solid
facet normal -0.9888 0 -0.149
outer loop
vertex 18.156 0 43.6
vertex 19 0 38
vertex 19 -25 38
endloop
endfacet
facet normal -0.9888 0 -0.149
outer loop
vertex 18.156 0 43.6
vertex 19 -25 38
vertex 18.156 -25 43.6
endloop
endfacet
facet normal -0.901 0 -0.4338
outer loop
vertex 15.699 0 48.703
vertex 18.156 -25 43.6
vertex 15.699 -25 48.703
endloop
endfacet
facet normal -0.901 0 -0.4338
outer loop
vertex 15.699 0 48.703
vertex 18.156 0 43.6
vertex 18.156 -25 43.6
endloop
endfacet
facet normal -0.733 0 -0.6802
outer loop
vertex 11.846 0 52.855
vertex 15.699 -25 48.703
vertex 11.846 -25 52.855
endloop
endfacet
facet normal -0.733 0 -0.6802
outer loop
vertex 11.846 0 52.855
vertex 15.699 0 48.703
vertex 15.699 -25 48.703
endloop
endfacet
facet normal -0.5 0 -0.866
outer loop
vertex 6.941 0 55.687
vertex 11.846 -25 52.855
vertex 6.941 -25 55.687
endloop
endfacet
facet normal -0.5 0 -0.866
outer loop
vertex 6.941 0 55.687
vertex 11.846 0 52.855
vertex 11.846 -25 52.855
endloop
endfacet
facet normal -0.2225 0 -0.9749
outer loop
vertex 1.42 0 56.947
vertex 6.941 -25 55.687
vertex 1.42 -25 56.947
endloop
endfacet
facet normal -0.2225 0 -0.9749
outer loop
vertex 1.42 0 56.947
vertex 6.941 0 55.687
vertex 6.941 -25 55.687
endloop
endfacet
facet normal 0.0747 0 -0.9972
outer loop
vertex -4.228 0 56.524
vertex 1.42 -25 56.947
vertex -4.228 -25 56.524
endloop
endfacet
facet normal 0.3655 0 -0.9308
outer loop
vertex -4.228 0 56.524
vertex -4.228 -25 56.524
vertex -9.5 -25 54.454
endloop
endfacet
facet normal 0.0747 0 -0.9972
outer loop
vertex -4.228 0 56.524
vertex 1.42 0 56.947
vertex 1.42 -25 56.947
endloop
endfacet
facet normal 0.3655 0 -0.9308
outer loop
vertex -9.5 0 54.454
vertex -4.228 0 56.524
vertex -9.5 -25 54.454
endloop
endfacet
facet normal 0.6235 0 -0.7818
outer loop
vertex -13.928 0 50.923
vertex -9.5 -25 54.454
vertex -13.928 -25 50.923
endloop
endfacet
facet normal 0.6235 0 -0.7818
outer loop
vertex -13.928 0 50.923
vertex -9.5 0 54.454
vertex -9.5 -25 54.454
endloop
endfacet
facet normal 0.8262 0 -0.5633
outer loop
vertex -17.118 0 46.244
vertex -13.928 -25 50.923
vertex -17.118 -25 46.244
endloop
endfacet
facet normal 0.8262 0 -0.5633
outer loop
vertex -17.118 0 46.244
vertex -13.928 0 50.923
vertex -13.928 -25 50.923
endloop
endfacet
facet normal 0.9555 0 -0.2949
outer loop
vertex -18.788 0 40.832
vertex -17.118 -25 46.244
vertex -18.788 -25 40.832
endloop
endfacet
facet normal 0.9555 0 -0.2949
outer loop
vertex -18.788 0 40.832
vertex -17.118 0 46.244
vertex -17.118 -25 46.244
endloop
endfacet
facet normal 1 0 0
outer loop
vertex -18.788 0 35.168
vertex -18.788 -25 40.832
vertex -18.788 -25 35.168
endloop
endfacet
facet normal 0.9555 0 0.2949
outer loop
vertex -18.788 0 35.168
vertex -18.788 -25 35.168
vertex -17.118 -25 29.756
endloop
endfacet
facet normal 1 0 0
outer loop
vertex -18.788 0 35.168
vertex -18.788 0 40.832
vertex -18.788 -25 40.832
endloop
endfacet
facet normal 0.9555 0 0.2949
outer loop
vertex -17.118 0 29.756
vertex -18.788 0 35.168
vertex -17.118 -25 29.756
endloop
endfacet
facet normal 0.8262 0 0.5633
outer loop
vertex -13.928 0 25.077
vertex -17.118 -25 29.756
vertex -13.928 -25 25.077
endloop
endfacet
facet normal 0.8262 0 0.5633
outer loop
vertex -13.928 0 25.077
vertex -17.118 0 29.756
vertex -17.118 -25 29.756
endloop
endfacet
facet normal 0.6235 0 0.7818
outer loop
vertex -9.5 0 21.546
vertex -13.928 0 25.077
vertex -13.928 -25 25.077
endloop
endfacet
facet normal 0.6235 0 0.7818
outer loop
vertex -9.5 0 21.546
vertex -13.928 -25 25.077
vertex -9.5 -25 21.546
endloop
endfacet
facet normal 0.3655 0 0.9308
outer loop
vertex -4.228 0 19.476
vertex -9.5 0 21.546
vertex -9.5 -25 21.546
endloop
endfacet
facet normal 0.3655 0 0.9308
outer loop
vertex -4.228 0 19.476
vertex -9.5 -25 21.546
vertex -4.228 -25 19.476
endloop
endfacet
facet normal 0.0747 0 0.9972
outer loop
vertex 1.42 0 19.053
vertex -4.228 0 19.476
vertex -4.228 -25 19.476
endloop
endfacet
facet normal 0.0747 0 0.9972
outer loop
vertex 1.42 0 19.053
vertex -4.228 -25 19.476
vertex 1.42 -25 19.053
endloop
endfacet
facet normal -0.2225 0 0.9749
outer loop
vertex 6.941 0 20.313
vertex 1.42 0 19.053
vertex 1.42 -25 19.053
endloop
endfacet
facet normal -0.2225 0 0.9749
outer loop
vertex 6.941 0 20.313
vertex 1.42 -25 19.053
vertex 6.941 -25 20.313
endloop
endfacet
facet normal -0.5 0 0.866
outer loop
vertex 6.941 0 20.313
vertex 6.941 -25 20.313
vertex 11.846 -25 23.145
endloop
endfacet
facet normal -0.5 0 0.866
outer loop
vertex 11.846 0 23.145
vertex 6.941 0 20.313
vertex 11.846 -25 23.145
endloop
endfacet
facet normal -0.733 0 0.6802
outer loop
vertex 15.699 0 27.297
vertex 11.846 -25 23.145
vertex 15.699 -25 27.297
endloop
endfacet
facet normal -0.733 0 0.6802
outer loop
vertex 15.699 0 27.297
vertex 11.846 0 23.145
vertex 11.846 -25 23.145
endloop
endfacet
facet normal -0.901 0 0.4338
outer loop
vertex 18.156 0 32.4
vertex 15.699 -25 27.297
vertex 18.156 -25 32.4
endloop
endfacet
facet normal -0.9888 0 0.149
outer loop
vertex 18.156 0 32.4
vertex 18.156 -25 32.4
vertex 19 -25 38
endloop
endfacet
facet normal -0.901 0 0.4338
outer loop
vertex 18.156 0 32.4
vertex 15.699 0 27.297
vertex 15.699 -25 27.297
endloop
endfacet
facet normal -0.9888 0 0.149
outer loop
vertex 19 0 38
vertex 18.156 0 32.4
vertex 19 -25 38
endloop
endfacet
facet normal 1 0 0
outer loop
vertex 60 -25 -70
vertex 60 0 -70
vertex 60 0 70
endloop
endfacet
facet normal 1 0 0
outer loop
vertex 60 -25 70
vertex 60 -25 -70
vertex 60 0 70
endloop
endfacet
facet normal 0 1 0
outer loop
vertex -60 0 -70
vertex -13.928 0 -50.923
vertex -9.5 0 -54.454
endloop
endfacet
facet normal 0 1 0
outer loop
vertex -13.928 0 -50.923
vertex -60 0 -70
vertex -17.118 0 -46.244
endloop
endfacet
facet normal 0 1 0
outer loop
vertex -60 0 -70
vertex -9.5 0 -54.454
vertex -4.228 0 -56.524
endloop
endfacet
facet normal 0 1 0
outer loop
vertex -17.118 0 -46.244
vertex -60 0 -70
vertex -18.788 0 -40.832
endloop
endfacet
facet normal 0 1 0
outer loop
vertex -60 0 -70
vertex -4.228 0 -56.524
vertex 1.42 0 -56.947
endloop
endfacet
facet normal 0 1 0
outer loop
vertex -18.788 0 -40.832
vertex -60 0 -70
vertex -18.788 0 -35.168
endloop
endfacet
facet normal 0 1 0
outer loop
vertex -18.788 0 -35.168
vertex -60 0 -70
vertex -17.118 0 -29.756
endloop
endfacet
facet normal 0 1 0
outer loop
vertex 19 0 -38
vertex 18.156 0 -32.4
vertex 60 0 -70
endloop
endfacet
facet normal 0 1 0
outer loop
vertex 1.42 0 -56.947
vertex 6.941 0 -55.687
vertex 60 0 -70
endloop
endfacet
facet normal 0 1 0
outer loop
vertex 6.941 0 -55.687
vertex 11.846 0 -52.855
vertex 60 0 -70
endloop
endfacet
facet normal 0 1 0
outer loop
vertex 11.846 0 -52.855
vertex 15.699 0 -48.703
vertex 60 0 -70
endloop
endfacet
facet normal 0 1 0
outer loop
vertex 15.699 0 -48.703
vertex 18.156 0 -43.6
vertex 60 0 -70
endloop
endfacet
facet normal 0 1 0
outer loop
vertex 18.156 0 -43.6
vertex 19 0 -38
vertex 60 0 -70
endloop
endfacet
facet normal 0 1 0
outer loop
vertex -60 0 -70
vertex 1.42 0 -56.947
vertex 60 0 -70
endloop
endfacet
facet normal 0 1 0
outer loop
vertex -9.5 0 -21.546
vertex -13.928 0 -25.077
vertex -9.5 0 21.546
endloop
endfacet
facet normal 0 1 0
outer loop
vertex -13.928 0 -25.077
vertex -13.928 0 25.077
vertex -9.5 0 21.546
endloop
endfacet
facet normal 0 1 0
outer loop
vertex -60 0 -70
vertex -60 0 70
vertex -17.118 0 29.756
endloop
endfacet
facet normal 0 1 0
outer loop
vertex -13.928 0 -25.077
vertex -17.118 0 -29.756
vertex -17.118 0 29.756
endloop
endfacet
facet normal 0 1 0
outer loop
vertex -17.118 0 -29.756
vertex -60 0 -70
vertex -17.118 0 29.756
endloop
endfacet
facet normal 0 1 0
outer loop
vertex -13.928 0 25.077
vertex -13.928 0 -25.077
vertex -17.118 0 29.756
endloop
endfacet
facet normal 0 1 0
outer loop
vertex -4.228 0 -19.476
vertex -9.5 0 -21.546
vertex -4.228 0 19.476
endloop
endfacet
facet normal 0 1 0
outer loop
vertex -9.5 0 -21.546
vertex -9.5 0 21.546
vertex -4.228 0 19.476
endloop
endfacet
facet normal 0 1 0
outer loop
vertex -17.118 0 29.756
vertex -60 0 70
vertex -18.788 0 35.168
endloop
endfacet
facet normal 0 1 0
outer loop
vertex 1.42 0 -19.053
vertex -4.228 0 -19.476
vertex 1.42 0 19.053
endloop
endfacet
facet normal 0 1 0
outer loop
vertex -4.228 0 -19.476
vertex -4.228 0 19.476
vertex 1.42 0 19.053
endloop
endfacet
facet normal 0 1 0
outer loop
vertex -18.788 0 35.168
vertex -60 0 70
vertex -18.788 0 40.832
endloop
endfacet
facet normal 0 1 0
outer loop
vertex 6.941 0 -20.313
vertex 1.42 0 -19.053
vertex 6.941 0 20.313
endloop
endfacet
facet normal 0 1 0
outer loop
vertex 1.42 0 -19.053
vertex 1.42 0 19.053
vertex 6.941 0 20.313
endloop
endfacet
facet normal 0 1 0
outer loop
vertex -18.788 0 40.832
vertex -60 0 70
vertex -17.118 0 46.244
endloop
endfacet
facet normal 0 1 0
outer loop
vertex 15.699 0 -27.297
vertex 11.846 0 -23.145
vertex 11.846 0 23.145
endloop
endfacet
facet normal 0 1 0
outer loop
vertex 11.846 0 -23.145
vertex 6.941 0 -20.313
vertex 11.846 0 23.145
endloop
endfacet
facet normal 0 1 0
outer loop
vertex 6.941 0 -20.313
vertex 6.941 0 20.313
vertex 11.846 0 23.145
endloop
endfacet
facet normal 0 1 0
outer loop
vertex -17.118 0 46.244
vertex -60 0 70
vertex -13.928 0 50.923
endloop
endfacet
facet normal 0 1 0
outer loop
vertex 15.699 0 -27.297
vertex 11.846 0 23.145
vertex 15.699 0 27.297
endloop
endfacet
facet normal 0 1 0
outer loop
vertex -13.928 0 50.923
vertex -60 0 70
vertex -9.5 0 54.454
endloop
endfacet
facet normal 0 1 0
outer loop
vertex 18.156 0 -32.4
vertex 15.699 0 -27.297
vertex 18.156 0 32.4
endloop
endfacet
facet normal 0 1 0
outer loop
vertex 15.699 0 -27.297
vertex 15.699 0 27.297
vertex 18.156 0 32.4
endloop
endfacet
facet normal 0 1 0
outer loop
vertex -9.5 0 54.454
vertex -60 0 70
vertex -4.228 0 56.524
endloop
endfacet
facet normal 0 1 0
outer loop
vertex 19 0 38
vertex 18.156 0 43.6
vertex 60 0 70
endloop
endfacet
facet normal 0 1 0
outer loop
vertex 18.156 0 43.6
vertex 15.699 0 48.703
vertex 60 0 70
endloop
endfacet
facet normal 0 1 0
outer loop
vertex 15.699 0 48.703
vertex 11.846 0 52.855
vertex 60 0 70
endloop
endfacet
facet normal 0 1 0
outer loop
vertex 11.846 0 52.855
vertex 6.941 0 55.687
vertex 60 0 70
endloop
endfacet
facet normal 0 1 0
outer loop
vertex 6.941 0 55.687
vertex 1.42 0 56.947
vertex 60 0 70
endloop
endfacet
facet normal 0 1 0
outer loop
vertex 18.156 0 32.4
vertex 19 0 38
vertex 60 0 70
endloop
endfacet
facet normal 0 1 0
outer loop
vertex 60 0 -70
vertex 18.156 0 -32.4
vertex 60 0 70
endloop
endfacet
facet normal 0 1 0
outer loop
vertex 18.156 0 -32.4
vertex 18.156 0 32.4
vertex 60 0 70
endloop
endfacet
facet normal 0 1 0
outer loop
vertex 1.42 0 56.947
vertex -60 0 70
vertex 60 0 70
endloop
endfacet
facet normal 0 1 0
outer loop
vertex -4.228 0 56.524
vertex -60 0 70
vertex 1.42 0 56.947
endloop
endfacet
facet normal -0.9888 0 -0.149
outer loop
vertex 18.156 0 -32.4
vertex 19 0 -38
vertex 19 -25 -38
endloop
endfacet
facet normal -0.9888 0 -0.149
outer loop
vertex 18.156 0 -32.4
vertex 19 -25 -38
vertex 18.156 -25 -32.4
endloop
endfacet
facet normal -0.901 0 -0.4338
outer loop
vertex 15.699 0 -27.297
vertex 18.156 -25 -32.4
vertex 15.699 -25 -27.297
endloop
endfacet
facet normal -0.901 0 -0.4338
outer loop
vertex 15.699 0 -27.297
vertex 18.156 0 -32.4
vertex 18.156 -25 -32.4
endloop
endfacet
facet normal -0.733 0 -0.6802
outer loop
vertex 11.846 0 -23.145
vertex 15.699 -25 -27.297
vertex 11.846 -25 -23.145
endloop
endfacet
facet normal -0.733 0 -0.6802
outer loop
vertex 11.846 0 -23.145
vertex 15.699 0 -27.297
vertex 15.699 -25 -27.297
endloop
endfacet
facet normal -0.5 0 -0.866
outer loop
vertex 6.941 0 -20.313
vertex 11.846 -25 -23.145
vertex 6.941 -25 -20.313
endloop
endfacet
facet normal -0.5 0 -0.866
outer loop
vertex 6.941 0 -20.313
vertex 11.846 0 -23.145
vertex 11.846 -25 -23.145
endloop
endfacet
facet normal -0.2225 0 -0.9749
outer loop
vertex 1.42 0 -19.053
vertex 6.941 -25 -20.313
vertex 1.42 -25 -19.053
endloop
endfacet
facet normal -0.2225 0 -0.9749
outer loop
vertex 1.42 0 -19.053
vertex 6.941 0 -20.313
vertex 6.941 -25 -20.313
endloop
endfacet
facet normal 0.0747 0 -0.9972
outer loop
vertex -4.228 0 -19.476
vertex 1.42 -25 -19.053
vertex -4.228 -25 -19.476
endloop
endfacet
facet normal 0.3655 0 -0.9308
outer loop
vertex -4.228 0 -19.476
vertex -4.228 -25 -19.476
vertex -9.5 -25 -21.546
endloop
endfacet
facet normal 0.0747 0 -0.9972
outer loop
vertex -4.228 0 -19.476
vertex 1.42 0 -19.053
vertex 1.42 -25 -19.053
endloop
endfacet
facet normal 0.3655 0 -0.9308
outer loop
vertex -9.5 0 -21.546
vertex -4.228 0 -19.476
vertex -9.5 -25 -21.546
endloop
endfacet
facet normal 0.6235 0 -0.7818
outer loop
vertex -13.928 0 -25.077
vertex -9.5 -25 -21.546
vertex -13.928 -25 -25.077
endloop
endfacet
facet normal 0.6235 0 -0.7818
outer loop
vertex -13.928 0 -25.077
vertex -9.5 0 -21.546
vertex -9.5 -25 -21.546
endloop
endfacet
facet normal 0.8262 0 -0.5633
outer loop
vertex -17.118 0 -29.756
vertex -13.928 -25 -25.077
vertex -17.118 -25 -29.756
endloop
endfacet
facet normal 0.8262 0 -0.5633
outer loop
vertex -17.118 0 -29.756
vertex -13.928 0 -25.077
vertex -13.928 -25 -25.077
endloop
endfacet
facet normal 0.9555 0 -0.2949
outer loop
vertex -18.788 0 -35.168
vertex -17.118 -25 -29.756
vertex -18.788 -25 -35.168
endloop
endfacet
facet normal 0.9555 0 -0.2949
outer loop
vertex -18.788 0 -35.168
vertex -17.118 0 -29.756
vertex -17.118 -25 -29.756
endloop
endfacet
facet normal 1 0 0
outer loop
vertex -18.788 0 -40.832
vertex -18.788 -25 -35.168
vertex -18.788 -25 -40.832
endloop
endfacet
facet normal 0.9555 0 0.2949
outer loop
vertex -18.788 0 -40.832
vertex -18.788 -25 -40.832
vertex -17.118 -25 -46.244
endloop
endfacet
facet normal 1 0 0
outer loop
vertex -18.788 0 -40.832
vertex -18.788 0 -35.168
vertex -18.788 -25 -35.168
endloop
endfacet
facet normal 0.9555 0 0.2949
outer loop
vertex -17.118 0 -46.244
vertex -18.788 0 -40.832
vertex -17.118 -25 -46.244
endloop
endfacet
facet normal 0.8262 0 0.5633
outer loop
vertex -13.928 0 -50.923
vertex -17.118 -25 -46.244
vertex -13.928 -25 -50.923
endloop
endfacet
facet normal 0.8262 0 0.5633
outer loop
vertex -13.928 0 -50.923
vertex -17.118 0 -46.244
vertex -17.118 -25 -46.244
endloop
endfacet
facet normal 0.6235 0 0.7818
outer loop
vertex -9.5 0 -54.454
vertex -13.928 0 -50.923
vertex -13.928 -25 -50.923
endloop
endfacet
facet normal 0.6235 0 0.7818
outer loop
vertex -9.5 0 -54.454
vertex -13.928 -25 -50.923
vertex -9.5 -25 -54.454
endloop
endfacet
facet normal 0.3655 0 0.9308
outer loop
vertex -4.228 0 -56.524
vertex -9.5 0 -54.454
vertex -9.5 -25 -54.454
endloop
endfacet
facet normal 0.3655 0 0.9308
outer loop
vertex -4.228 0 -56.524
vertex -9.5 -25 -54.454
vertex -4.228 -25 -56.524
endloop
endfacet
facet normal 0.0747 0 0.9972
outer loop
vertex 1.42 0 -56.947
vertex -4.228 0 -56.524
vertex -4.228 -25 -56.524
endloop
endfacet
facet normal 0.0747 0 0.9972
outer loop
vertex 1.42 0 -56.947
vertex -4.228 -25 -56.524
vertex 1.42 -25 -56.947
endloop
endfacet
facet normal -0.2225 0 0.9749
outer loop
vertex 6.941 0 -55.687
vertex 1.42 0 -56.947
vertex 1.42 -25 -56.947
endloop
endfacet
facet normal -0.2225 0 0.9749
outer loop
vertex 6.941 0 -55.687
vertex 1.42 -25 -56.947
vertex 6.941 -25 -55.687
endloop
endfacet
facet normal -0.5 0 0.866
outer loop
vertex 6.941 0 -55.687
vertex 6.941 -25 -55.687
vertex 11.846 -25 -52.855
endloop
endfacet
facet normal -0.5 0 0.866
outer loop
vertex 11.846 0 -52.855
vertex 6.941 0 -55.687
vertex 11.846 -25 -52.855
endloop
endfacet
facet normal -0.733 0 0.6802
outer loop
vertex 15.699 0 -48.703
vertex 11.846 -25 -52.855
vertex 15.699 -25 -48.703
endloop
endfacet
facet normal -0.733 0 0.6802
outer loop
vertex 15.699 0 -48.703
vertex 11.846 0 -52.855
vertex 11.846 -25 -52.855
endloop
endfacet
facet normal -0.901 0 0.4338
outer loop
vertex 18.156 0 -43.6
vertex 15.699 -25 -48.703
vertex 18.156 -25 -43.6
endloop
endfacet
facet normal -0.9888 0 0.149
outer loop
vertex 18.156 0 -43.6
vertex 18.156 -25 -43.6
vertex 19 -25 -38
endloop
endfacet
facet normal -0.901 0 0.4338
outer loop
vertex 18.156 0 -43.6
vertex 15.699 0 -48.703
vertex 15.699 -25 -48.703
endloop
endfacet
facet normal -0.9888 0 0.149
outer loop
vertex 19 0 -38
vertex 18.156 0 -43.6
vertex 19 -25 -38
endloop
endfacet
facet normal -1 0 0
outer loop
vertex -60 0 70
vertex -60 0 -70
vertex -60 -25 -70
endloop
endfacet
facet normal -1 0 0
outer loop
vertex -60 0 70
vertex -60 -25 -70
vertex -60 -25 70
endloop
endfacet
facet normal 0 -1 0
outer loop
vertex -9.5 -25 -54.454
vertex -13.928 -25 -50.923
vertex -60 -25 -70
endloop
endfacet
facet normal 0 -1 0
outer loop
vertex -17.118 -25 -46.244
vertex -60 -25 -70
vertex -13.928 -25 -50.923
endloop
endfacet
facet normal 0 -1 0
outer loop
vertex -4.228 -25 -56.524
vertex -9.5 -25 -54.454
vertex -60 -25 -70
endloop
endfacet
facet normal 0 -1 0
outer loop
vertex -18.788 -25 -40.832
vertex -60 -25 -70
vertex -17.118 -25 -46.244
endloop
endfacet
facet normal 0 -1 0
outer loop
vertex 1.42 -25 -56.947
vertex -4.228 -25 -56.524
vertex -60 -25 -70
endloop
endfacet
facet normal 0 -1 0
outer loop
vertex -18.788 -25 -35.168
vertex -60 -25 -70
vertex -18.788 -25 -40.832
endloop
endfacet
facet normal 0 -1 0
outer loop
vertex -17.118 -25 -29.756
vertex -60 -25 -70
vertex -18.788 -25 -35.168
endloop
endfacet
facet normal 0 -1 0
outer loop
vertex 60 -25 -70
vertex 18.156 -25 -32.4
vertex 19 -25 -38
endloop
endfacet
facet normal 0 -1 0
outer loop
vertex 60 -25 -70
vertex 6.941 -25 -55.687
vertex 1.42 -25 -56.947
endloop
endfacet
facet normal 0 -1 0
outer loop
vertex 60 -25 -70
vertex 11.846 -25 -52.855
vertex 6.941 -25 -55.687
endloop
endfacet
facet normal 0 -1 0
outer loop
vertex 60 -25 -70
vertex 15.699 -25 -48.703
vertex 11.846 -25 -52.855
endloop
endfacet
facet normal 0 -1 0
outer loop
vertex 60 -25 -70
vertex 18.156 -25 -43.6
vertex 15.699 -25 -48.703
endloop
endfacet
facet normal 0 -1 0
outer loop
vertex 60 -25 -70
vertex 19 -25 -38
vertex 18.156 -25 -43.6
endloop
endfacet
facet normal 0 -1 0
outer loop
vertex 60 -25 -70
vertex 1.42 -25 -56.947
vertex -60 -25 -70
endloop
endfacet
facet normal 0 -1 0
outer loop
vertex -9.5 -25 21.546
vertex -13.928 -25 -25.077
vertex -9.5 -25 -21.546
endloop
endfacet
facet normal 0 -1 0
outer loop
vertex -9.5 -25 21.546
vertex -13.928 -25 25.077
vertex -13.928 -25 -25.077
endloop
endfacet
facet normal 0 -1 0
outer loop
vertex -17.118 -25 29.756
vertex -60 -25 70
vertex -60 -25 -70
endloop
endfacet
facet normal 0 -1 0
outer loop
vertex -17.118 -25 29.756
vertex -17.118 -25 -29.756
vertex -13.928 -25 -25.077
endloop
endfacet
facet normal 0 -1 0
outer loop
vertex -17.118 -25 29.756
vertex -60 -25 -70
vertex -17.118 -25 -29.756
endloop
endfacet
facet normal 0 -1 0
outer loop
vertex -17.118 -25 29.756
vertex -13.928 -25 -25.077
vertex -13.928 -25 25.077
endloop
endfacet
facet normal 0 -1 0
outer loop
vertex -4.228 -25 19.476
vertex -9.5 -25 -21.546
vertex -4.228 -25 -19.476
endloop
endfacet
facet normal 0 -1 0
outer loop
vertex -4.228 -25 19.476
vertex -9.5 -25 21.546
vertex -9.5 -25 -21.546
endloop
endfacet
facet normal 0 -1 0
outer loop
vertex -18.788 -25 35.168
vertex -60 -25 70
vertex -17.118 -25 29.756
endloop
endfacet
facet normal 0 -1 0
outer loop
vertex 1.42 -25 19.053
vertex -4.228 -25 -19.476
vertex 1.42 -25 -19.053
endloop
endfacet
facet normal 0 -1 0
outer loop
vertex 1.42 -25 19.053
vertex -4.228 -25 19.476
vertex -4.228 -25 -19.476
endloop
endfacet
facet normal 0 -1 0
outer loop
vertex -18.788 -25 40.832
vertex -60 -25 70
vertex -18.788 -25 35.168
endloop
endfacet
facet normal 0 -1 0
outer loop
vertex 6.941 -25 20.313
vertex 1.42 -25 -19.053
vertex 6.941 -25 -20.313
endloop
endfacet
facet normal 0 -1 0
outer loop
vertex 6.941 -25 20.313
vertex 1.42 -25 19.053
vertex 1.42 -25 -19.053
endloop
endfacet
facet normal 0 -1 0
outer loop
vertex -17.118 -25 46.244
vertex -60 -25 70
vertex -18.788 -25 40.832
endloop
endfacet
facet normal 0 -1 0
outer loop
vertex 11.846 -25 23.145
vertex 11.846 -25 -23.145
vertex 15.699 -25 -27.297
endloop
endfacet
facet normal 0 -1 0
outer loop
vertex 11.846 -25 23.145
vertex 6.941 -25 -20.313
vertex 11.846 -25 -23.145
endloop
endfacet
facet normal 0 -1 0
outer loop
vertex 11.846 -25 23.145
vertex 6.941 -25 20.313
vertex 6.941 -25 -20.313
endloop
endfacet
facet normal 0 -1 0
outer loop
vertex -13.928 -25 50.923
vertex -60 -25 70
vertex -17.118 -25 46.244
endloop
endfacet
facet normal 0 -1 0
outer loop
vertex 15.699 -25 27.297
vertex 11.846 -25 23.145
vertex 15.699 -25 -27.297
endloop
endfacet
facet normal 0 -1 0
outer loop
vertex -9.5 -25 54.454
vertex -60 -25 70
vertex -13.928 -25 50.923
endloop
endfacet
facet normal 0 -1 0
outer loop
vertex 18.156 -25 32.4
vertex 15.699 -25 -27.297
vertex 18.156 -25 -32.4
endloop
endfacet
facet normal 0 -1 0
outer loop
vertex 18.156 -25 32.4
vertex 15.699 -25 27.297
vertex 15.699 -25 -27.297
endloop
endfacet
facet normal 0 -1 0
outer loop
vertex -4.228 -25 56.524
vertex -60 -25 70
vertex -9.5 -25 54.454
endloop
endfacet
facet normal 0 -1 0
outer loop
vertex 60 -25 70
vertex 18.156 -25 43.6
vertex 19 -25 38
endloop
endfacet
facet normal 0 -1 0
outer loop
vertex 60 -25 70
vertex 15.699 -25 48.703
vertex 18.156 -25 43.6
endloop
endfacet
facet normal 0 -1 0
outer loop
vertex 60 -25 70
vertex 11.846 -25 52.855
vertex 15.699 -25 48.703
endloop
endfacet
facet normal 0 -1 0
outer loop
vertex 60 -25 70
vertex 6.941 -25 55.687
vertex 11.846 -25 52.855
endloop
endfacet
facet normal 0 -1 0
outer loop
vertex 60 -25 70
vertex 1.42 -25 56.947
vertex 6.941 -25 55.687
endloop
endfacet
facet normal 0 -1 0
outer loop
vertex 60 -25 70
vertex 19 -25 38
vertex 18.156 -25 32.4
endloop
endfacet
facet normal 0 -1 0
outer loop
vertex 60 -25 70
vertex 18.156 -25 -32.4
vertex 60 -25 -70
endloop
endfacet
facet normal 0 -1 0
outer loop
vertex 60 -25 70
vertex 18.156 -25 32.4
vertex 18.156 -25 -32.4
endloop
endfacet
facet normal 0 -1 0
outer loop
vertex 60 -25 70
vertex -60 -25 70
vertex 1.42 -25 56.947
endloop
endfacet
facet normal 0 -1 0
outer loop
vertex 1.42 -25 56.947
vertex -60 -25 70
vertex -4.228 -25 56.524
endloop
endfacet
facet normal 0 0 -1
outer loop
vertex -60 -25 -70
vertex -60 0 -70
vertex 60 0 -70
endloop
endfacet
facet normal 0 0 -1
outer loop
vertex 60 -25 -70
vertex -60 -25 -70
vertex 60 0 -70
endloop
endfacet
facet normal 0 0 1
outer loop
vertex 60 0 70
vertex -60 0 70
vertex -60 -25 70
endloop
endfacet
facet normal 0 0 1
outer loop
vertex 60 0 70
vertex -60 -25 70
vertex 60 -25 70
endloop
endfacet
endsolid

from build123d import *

# Parameters (mm, degrees)
F0_W     = 120
F0_H     = 140
F0_R     = 19
F1_DEPTH = 25
F2_DEPTH = 25


with BuildPart() as f1:
    # F0 (on Front) → F1 (new body)
    with BuildSketch(Plane.XZ):
        Rectangle(F0_W, F0_H)
        with Locations((0, -38)):
            Circle(F0_R, mode=Mode.SUBTRACT)
        with Locations((0, 38)):
            Circle(F0_R, mode=Mode.SUBTRACT)
    extrude(amount=F1_DEPTH)

    # F0 (on Front) → F2 (cut)
    with BuildSketch(Plane.XZ):
        with Locations((0, 38)):
            Circle(F0_R)
    extrude(amount=F2_DEPTH, mode=Mode.SUBTRACT)


solid = f1.part
